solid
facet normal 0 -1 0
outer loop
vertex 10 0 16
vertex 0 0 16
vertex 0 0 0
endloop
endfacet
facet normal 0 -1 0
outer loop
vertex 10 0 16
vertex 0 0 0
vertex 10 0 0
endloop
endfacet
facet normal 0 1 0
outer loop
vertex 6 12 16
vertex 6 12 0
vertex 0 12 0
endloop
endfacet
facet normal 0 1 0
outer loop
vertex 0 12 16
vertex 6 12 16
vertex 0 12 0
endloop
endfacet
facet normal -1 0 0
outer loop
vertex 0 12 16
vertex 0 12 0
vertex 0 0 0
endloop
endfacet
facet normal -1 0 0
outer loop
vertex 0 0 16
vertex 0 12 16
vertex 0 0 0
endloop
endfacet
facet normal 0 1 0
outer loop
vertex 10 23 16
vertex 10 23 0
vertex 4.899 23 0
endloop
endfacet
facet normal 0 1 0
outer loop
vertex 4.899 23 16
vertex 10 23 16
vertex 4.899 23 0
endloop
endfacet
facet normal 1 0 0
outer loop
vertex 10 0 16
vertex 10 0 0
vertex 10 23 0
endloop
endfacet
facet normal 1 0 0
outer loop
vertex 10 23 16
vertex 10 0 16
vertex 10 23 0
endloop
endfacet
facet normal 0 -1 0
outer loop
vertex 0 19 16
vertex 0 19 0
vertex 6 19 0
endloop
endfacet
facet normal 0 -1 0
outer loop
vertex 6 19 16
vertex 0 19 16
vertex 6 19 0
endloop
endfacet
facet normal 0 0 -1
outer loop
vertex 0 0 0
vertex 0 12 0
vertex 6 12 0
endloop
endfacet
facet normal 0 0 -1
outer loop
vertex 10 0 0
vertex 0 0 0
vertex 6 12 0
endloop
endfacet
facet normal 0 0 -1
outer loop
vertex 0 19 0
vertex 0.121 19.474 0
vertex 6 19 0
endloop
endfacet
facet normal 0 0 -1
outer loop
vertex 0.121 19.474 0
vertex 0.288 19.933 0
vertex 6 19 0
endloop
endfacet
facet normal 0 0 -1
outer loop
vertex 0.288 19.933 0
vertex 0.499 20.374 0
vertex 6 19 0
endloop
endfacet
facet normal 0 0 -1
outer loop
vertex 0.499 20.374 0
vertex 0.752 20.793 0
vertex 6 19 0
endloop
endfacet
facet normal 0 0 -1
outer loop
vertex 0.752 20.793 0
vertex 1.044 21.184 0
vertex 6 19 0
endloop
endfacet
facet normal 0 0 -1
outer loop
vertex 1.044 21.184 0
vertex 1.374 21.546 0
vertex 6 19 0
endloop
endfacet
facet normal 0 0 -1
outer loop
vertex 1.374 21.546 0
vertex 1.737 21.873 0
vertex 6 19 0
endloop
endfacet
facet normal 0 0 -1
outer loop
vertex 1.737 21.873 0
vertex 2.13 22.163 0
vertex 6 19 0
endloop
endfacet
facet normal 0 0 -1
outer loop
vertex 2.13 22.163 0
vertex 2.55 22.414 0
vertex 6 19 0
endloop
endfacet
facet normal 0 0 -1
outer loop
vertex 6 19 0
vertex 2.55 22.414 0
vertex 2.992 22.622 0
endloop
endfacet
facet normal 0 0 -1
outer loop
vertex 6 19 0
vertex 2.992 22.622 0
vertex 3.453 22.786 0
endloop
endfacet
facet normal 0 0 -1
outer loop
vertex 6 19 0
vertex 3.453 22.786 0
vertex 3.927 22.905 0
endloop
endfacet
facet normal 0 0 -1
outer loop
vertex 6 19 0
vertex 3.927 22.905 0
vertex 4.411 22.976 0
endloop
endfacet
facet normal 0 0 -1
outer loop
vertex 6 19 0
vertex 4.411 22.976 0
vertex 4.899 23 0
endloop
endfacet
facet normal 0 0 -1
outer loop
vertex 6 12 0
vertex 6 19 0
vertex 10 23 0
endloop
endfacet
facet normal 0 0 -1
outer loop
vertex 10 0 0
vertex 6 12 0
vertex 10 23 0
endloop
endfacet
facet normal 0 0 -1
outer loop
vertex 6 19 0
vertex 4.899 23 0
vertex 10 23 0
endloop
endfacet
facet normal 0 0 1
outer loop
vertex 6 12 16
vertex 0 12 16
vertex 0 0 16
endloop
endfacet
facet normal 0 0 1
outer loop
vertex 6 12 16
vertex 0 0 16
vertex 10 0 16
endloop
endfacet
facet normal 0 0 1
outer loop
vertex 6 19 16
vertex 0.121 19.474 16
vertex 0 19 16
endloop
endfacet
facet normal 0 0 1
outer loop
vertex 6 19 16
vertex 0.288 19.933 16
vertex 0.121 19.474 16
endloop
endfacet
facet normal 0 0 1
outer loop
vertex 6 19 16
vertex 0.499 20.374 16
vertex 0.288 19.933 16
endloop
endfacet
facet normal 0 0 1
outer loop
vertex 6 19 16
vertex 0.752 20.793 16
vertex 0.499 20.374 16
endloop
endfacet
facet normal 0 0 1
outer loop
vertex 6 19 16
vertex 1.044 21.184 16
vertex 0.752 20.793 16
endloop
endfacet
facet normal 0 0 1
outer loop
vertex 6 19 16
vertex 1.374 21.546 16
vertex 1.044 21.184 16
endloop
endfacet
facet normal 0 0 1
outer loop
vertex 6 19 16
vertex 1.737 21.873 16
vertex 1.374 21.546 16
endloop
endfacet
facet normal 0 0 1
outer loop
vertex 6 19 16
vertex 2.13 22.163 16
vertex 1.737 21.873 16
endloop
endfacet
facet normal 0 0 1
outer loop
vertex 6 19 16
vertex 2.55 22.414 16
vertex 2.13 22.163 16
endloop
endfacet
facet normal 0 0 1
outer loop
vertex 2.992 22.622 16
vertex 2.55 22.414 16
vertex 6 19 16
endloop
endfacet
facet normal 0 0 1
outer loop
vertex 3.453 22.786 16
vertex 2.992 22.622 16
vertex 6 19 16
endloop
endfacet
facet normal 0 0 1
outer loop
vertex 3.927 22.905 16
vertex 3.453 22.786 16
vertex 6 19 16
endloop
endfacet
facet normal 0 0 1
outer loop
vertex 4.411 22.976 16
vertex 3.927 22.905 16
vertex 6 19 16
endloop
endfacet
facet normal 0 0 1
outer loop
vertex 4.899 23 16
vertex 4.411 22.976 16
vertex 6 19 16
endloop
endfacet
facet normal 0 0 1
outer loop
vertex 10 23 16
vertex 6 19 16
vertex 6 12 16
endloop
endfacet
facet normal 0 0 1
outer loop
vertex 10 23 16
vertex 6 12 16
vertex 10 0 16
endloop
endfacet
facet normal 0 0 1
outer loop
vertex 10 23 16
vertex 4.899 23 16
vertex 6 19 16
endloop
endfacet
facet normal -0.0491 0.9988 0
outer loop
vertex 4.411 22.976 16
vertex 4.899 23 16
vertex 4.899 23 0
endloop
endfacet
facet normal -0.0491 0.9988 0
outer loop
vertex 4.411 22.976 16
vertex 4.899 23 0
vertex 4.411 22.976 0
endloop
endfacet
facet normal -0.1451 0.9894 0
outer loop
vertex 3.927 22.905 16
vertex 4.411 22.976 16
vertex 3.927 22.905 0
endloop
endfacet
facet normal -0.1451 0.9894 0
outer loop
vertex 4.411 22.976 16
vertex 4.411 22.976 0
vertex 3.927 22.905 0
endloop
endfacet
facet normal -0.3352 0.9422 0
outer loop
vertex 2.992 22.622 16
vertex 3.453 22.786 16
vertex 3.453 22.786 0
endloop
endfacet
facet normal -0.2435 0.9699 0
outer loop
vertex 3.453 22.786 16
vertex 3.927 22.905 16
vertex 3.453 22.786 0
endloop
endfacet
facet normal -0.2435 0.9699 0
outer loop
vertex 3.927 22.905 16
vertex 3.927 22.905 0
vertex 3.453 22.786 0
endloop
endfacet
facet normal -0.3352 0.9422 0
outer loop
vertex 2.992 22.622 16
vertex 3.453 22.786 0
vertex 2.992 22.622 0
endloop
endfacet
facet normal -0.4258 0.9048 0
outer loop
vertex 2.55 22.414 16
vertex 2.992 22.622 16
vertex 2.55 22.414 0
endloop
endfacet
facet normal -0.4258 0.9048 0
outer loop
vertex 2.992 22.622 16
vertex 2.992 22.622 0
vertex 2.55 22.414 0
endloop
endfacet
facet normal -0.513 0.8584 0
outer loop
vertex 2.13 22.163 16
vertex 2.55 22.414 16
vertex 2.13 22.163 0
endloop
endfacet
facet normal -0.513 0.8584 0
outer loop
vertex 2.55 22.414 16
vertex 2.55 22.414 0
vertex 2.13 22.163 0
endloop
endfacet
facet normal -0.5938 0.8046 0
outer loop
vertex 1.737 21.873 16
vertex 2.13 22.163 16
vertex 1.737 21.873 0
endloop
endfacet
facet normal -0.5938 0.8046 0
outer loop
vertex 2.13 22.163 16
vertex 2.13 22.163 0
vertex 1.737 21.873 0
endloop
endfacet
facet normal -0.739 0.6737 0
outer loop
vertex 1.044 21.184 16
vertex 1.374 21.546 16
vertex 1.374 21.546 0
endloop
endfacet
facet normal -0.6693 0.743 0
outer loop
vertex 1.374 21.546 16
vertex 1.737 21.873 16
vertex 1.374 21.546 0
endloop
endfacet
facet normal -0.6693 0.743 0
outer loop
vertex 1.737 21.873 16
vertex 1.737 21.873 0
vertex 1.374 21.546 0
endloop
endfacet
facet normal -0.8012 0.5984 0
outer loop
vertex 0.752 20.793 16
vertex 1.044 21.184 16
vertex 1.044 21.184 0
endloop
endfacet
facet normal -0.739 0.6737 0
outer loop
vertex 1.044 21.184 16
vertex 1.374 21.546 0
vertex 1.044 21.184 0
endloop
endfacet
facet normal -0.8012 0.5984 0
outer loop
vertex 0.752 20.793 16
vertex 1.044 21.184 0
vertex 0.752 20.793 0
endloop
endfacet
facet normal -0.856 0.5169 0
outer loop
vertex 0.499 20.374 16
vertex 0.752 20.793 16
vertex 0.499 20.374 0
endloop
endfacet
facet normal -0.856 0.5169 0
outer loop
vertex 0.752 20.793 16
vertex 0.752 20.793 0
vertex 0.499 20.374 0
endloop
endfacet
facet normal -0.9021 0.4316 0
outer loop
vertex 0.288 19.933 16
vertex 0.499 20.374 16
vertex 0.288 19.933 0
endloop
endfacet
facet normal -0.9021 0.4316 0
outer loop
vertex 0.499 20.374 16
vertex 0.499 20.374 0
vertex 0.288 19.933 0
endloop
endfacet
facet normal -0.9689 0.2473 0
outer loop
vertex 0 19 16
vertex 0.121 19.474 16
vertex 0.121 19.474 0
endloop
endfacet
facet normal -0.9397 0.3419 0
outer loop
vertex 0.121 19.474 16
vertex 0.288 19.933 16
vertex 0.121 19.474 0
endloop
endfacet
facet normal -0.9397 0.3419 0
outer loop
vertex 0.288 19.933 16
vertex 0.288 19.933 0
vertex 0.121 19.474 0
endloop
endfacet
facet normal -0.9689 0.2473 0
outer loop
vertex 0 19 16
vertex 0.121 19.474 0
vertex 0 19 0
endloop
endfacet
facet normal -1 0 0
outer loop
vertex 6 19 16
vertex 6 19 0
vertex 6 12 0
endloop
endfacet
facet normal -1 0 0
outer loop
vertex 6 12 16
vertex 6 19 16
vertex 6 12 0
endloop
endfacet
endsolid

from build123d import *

# Parameters (mm, degrees)
BOSS_EXTRUDE1_DEPTH = 16
FILLET1_R           = 5


with BuildPart() as part:
    # Sketch1 → Boss-Extrude1 (new body)
    with BuildSketch(Plane.XY):
        Polygon((0, 0), (10, 0), (10, 23), (0, 23), (0, 19), (6, 19), (6, 12), (0, 12), align=None)
    extrude(amount=BOSS_EXTRUDE1_DEPTH)

    # Fillet1
    # the kernel refuses this fillet: 5 mm, written as the material it takes off along each edge
    with BuildSketch(Plane(origin=(0, 23, -12.247448714), x_dir=(1, 0, 0), z_dir=(0, 0, 1))) as fillet1_piece_1:
        with BuildLine():
            CenterArc((4.898979486, -5), FILLET1_R, 90, 78.463040967)
            Line((0, -4), (-0.09797959, -3.98))
            ThreePointArc((-0.09797959, -3.98), (-0.1, -2), (-0.1, 0))
            Line((-0.1, 0), (0, 0.1))
            Line((0, 0.1), (4.898979486, 0.1))
            Line((4.898979486, 0.1), (4.898979486, 0))
        make_face()
    extrude(amount=40.494897428, mode=Mode.SUBTRACT)


solid = part.part
